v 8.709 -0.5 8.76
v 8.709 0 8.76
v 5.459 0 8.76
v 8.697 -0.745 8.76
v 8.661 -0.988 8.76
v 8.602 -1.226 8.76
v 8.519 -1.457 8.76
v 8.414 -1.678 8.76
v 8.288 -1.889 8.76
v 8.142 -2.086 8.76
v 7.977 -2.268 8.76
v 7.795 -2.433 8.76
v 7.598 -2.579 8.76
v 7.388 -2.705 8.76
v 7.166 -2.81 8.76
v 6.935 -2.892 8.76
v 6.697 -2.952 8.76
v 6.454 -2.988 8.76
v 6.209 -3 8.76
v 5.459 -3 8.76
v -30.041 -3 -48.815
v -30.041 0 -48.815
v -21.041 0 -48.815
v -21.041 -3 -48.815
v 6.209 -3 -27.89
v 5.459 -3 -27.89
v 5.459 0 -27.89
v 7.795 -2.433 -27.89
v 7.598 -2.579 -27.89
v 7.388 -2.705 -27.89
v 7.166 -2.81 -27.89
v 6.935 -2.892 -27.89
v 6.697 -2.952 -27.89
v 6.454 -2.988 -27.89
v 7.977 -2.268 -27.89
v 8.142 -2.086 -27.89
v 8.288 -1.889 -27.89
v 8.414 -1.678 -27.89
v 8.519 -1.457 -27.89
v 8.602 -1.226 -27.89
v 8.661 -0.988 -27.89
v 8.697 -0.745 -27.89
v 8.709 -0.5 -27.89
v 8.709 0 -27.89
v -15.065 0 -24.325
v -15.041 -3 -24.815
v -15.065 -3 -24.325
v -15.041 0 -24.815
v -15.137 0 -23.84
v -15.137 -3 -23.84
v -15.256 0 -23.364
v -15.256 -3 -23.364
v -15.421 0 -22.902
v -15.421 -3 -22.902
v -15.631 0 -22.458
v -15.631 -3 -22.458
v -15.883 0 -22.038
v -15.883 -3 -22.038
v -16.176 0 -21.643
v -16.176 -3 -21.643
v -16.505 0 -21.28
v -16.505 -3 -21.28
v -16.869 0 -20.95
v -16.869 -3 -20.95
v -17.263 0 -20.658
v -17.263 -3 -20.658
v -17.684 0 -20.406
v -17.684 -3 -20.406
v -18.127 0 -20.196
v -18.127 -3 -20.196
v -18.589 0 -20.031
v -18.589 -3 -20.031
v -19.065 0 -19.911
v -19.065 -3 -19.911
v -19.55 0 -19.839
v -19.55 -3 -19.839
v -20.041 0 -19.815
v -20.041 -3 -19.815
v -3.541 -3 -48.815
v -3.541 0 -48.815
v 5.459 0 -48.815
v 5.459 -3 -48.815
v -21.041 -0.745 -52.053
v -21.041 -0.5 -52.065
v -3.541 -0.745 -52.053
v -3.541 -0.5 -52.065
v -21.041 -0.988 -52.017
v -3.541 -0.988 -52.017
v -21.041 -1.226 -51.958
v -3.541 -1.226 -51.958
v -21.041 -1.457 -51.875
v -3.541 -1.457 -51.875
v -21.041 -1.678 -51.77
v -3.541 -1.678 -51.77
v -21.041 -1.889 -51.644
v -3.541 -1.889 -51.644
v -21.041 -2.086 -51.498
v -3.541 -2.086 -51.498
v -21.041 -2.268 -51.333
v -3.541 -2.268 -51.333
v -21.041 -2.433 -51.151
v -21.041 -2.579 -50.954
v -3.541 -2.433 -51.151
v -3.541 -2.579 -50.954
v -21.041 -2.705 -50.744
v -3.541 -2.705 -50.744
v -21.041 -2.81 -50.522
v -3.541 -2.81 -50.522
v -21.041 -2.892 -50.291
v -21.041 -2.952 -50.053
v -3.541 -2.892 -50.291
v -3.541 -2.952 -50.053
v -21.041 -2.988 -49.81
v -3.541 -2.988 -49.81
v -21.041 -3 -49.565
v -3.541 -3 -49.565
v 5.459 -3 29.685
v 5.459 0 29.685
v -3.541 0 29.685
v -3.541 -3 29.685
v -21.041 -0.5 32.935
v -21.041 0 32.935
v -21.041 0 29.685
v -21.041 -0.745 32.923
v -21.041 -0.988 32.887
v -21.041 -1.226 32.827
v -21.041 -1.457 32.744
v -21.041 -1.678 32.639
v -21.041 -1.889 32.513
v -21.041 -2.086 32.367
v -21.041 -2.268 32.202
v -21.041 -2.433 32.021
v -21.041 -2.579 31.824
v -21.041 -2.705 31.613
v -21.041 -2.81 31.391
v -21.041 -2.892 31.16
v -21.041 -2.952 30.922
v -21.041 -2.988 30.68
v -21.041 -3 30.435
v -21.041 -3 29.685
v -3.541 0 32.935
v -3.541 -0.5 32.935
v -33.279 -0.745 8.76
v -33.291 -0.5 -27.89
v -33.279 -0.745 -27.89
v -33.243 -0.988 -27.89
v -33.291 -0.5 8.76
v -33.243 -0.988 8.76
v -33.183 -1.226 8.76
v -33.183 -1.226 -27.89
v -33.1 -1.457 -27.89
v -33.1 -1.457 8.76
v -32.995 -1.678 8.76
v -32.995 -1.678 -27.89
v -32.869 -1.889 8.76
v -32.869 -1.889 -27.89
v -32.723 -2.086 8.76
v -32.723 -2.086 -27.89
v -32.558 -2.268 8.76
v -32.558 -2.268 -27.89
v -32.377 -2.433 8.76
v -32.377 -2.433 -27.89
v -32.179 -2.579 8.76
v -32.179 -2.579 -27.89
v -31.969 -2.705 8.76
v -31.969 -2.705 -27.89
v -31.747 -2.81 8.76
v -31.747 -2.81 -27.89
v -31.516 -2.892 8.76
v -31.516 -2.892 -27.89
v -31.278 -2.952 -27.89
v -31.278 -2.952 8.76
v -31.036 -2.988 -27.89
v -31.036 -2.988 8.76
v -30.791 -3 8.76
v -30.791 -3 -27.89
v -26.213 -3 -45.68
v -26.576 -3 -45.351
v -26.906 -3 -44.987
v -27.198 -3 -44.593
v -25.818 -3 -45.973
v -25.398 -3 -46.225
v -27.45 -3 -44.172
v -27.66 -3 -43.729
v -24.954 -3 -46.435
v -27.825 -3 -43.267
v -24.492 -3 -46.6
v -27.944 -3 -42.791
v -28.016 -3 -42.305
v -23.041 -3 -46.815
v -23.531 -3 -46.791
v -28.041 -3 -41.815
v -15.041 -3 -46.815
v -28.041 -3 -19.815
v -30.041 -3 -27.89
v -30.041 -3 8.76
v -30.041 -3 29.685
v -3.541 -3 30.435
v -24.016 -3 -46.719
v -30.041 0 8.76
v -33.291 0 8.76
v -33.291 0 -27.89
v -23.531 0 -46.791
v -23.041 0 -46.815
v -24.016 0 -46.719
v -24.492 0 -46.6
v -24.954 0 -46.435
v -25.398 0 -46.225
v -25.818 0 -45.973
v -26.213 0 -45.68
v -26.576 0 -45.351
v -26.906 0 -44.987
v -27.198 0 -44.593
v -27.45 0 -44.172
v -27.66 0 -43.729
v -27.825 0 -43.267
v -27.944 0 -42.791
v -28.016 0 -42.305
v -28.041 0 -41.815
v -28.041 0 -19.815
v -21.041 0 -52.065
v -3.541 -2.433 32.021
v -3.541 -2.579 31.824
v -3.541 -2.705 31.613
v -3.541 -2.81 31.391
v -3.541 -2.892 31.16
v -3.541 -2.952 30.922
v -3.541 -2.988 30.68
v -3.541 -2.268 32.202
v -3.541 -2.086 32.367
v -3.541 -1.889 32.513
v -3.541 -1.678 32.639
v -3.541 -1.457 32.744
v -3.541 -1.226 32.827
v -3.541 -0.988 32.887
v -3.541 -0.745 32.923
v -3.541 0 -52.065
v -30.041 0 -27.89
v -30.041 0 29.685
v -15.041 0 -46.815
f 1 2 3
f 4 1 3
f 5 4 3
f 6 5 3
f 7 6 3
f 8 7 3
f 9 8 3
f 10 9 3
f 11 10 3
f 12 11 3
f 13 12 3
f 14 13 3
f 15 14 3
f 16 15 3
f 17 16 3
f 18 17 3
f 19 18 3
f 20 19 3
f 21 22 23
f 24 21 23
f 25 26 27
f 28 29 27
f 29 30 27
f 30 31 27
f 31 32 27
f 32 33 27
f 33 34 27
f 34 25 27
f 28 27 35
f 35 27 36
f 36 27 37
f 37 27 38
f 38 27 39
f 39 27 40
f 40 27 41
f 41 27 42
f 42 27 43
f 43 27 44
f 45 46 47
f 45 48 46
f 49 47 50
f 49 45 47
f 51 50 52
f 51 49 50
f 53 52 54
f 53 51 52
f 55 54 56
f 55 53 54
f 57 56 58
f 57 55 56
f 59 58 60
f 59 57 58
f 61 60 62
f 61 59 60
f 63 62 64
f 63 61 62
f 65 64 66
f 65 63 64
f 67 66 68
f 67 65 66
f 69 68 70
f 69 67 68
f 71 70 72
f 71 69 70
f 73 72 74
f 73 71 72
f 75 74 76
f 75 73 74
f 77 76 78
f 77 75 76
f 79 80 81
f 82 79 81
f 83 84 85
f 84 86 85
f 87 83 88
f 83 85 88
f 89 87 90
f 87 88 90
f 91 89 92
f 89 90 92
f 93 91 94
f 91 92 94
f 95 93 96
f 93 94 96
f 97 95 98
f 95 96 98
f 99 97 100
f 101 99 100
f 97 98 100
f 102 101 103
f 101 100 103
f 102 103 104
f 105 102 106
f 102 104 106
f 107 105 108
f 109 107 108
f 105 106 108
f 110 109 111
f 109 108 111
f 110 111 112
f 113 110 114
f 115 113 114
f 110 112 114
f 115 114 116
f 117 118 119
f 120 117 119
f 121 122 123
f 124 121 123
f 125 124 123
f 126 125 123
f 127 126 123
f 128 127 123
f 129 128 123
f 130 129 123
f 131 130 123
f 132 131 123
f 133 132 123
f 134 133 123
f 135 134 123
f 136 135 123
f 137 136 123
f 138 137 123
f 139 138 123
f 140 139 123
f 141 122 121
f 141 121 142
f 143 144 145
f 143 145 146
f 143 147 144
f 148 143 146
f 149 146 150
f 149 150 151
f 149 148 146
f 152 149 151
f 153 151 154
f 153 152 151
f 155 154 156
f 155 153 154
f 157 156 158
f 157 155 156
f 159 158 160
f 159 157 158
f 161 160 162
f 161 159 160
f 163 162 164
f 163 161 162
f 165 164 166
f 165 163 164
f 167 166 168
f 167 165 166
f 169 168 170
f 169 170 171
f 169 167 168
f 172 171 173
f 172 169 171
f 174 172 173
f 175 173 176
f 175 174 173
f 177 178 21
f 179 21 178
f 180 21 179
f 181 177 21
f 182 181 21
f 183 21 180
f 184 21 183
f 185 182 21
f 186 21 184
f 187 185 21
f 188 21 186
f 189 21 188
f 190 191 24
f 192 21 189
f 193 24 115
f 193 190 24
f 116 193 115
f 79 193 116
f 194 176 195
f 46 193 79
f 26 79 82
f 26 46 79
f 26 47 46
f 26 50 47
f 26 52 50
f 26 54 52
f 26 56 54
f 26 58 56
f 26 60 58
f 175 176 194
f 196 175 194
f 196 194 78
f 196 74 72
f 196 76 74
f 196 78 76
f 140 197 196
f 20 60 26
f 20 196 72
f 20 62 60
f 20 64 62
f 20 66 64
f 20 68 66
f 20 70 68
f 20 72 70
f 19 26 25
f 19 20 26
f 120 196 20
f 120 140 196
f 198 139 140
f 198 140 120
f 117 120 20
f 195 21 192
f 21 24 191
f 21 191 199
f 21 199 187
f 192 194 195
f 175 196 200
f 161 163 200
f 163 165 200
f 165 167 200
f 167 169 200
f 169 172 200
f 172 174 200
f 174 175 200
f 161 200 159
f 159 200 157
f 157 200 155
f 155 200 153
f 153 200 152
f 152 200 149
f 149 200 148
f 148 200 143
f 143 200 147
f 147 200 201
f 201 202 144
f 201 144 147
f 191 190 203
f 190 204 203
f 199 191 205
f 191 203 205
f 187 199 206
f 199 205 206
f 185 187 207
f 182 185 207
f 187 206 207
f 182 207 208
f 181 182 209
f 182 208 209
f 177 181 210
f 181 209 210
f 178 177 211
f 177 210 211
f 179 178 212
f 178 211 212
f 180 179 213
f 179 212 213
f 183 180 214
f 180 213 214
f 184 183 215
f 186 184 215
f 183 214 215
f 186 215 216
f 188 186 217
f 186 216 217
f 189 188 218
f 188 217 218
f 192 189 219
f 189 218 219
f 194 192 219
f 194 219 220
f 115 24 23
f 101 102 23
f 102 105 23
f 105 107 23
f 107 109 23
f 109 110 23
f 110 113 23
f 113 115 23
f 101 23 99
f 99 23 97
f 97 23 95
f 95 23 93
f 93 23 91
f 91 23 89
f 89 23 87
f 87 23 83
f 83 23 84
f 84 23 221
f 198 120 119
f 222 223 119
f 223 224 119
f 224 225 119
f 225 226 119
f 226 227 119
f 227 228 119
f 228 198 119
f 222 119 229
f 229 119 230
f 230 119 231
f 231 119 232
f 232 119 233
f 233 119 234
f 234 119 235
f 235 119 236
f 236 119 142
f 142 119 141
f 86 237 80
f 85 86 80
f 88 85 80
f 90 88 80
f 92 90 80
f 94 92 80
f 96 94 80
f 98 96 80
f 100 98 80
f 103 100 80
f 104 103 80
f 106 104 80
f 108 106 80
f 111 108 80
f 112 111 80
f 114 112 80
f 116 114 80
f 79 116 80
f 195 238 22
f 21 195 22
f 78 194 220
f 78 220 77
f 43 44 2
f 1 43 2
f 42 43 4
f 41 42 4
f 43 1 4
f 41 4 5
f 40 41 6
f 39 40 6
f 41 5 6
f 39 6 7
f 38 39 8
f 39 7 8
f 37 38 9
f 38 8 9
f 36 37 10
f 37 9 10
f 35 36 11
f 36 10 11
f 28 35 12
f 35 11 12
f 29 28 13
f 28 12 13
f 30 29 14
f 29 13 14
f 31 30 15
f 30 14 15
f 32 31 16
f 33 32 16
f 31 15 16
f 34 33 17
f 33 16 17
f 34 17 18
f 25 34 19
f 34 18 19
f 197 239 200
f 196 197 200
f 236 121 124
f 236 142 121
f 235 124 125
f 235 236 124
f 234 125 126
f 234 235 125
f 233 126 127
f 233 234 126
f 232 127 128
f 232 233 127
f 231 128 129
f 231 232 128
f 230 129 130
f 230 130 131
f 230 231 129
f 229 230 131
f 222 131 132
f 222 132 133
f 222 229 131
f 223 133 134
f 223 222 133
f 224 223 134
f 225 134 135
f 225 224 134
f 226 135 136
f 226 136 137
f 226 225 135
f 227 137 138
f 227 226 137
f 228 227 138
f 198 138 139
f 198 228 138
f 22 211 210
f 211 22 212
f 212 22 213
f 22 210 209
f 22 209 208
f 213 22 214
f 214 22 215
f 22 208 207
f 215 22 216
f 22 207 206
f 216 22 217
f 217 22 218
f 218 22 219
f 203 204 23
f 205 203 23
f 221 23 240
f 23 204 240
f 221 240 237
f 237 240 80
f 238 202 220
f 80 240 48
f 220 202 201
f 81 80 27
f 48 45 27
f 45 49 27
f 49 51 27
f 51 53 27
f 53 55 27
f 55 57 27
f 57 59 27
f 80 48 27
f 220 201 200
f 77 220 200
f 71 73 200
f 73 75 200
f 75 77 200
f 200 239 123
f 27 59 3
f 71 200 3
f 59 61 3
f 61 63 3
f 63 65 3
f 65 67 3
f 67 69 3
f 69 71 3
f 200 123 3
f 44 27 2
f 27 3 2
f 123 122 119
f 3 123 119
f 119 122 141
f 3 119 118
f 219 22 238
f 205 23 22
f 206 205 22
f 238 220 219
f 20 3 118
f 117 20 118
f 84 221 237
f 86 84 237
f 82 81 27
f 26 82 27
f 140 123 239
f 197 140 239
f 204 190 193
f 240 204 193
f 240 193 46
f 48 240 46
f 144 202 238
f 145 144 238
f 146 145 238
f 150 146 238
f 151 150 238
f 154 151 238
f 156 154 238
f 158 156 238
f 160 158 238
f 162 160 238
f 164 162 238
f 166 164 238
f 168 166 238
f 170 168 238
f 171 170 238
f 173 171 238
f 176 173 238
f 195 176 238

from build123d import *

# Parameters (mm, degrees)
F0_W     = 42
F0_H     = 85
F1_DEPTH = 3
F2_R     = 3
F4_DEPTH = 3
F5_W     = 13
F5_H     = 27
F6_DEPTH = 3
F7_R     = 5
F8_R     = 2.5


with BuildPart() as f1:
    # F0 (on Front) → F1 (new body)
    with BuildSketch(Plane.XZ):
        with Locations((-12.290565, -9.565399)):
            Rectangle(F0_W, F0_H)
    extrude(amount=F1_DEPTH)

    # F2
    f2_edges = [f1.edges().sort_by_distance(p)[0] for p in [
        (-33.290565, -1.5, 32.934601),
        (8.709435, -1.5, 32.934601),
        (8.709435, -1.5, -52.065399),
        (-33.290565, -1.5, -52.065399),
    ]]
    fillet(f2_edges, radius=F2_R)

    # F3 (on face) → F4 (cut, through all)
    with BuildSketch(Plane(origin=(0, 0, 0), x_dir=(-1, 0, 0), z_dir=(0, 1, 0))):
        with BuildLine():
            Line((-5.459435, 8.759601), (-5.459435, 29.684601))
            Line((-5.459435, 29.684601), (3.540565, 29.684601))
            Line((3.540565, 29.684601), (3.540565, 32.934601))
            Line((3.540565, 32.934601), (-5.709435, 32.934601))
            ThreePointArc((-5.709435, 32.934601), (-7.830755, 32.055922), (-8.709435, 29.934601))
            Line((-8.709435, 29.934601), (-8.709435, 8.759601))
            Line((-8.709435, 8.759601), (-5.459435, 8.759601))
        make_face()
        with BuildLine():
            Line((21.040565, 32.934601), (21.040565, 29.684601))
            Line((21.040565, 29.684601), (30.040565, 29.684601))
            Line((30.040565, 29.684601), (30.040565, 8.759601))
            Line((30.040565, 8.759601), (33.290565, 8.759601))
            Line((33.290565, 8.759601), (33.290565, 29.934601))
            ThreePointArc((33.290565, 29.934601), (32.411885, 32.055922), (30.290565, 32.934601))
            Line((30.290565, 32.934601), (21.040565, 32.934601))
        make_face()
        with BuildLine():
            Line((33.290565, -27.890399), (30.040565, -27.890399))
            Line((30.040565, -27.890399), (30.040565, -48.815399))
            Line((30.040565, -48.815399), (21.040565, -48.815399))
            Line((21.040565, -48.815399), (21.040565, -52.065399))
            Line((21.040565, -52.065399), (30.290565, -52.065399))
            ThreePointArc((30.290565, -52.065399), (32.411885, -51.186719), (33.290565, -49.065399))
            Line((33.290565, -49.065399), (33.290565, -27.890399))
        make_face()
        with BuildLine():
            Line((-5.459435, -48.815399), (-5.459435, -27.890399))
            Line((-5.459435, -27.890399), (-8.709435, -27.890399))
            Line((-8.709435, -27.890399), (-8.709435, -49.065399))
            ThreePointArc((-8.709435, -49.065399), (-7.830755, -51.186719), (-5.709435, -52.065399))
            Line((-5.709435, -52.065399), (3.540565, -52.065399))
            Line((3.540565, -52.065399), (3.540565, -48.815399))
            Line((3.540565, -48.815399), (-5.459435, -48.815399))
        make_face()
    extrude(amount=-F4_DEPTH, mode=Mode.SUBTRACT)

    # F5 (on face) → F6 (cut, through all)
    with BuildSketch(Plane.XZ.offset(3)):
        with Locations((-21.540565, -33.315399)):
            Rectangle(F5_W, F5_H)
    extrude(amount=-F6_DEPTH, mode=Mode.SUBTRACT)

    # F7
    f7_edges = [f1.edges().sort_by_distance(p)[0] for p in [
        (-15.040565, -1.5, -19.815399),
        (-28.040565, -1.5, -46.815399),
    ]]
    fillet(f7_edges, radius=F7_R)

    # F8
    f8_edges = [f1.edges().sort_by_distance(p)[0] for p in [
        (-12.290565, -3, 32.934601),
        (8.709435, -3, -9.565399),
        (-12.290565, -3, -52.065399),
        (-33.290565, -3, -9.565399),
    ]]
    fillet(f8_edges, radius=F8_R)


solid = f1.part
